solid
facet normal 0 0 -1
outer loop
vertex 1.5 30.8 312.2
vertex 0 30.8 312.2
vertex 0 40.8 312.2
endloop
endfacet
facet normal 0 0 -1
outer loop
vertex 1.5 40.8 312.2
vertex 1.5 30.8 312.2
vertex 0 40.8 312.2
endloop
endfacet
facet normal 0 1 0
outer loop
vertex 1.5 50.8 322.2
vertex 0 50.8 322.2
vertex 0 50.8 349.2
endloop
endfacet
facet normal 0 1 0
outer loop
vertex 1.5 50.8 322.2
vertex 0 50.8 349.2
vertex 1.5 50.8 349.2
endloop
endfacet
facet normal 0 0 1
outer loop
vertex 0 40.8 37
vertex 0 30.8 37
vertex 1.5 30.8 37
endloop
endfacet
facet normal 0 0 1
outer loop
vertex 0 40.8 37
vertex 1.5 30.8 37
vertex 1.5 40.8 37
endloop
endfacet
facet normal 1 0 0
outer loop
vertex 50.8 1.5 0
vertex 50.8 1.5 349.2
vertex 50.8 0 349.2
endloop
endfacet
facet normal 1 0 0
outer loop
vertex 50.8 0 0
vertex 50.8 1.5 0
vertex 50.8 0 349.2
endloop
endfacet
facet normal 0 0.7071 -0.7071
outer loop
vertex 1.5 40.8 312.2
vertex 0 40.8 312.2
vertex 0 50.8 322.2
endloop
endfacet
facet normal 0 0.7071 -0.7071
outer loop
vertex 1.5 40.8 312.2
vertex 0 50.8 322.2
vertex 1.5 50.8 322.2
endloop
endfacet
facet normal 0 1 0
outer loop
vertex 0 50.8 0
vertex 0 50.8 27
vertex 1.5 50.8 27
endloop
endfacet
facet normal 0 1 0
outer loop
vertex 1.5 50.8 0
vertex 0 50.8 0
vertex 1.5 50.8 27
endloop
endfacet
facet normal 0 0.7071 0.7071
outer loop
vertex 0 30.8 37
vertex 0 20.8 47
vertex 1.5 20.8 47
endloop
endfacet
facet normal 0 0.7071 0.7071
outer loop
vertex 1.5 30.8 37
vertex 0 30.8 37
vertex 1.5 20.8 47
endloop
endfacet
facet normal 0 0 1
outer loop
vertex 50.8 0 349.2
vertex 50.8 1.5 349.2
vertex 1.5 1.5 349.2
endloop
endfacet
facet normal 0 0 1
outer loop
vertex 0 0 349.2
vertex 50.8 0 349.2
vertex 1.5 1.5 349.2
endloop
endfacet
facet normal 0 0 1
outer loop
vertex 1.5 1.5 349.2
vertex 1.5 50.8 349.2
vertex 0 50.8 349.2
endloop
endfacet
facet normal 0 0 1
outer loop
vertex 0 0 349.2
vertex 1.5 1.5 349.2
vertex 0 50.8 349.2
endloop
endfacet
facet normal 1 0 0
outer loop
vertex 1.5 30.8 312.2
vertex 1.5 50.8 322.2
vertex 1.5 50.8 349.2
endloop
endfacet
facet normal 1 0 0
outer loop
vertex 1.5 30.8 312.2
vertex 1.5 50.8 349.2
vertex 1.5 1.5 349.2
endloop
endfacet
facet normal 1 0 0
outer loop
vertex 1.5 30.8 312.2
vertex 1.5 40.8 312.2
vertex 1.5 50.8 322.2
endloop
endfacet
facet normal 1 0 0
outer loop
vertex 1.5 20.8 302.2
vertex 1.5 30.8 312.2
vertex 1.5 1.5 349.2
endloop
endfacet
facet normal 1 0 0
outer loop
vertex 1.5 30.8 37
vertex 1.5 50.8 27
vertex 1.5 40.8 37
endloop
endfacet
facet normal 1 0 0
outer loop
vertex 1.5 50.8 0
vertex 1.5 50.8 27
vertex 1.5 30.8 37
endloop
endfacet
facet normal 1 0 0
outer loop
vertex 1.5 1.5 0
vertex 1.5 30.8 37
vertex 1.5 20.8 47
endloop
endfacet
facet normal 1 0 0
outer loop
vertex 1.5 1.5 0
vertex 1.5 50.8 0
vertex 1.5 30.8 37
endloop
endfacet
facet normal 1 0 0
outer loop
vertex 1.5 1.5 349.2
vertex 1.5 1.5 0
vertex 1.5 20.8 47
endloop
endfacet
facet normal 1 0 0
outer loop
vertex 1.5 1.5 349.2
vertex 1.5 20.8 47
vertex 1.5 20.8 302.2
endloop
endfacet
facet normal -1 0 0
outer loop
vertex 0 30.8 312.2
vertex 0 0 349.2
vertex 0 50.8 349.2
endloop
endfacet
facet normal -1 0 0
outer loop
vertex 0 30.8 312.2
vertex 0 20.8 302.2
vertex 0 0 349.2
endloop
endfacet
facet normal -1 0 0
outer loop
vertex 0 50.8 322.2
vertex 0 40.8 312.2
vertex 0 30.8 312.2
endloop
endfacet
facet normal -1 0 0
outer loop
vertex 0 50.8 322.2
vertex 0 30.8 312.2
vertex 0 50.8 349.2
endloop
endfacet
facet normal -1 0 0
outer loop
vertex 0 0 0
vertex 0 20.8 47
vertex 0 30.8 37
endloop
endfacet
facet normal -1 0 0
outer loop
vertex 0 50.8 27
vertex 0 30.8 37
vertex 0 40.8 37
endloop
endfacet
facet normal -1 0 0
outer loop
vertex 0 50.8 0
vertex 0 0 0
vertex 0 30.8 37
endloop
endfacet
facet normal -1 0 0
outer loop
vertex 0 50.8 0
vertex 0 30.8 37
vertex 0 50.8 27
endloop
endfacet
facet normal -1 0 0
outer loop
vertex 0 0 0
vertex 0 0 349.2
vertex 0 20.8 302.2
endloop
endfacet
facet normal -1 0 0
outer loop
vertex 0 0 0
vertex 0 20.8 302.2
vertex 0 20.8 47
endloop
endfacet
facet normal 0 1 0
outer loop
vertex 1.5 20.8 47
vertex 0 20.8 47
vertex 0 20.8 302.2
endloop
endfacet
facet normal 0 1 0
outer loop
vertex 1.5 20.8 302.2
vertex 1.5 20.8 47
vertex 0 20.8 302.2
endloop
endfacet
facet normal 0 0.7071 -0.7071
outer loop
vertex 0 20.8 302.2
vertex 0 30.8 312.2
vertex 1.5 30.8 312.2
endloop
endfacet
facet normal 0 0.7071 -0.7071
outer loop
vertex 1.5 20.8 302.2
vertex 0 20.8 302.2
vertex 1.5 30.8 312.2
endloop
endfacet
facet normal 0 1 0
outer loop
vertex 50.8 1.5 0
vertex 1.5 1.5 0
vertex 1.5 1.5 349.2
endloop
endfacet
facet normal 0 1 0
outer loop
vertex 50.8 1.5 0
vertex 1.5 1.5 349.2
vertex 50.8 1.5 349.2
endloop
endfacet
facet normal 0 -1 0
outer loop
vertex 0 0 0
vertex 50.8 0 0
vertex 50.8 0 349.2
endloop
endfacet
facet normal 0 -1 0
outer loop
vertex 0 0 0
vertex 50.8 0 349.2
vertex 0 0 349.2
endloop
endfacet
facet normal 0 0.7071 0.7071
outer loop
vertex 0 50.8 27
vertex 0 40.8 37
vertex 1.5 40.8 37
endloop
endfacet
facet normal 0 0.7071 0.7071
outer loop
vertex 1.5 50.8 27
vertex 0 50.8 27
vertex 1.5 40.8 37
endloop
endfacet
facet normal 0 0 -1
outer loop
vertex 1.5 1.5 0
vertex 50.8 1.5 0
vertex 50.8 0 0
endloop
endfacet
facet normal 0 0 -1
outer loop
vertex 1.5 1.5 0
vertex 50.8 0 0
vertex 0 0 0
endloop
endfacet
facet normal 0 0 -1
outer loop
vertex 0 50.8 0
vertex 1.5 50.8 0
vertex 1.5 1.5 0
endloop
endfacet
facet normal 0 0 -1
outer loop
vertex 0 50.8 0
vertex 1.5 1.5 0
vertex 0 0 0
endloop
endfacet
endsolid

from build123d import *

# Parameters (mm, degrees)
SALIENTE_EXTRUIR1_DEPTH    = 349.2
CROQUIS5_W                 = 275.2
CROQUIS5_H                 = 30
CORTAR_EXTRUIR2_DEPTH      = 1
CORTAR_EXTRUIR2_DEPTH_BACK = 2
CHAFL_N1_SIZE              = 10


with BuildPart() as part:
    # Croquis1 → Saliente-Extruir1 (new body)
    with BuildSketch(Plane.XY):
        Polygon((0, 0), (0, 50.8), (1.5, 50.8), (1.5, 1.5), (50.8, 1.5), (50.8, 0), align=None)
    extrude(amount=SALIENTE_EXTRUIR1_DEPTH)

    # Croquis5 → Cortar-Extruir2 (cut, two sides)
    with BuildSketch(Plane.ZY) as cortar_extruir2_sk:
        with Locations((174.6, 35.8)):
            Rectangle(CROQUIS5_W, CROQUIS5_H)
    extrude(amount=CORTAR_EXTRUIR2_DEPTH, mode=Mode.SUBTRACT)
    extrude(cortar_extruir2_sk.sketch, amount=-CORTAR_EXTRUIR2_DEPTH_BACK, mode=Mode.SUBTRACT)

    # Chaflán1
    chafl_n1_edges = [part.edges().sort_by_distance(p)[0] for p in [
        (0.75, 20.8, 37),
        (0.75, 20.8, 312.2),
        (0.75, 50.8, 312.2),
        (0.75, 50.8, 37),
    ]]
    chamfer(chafl_n1_edges, length=CHAFL_N1_SIZE)


solid = part.part
